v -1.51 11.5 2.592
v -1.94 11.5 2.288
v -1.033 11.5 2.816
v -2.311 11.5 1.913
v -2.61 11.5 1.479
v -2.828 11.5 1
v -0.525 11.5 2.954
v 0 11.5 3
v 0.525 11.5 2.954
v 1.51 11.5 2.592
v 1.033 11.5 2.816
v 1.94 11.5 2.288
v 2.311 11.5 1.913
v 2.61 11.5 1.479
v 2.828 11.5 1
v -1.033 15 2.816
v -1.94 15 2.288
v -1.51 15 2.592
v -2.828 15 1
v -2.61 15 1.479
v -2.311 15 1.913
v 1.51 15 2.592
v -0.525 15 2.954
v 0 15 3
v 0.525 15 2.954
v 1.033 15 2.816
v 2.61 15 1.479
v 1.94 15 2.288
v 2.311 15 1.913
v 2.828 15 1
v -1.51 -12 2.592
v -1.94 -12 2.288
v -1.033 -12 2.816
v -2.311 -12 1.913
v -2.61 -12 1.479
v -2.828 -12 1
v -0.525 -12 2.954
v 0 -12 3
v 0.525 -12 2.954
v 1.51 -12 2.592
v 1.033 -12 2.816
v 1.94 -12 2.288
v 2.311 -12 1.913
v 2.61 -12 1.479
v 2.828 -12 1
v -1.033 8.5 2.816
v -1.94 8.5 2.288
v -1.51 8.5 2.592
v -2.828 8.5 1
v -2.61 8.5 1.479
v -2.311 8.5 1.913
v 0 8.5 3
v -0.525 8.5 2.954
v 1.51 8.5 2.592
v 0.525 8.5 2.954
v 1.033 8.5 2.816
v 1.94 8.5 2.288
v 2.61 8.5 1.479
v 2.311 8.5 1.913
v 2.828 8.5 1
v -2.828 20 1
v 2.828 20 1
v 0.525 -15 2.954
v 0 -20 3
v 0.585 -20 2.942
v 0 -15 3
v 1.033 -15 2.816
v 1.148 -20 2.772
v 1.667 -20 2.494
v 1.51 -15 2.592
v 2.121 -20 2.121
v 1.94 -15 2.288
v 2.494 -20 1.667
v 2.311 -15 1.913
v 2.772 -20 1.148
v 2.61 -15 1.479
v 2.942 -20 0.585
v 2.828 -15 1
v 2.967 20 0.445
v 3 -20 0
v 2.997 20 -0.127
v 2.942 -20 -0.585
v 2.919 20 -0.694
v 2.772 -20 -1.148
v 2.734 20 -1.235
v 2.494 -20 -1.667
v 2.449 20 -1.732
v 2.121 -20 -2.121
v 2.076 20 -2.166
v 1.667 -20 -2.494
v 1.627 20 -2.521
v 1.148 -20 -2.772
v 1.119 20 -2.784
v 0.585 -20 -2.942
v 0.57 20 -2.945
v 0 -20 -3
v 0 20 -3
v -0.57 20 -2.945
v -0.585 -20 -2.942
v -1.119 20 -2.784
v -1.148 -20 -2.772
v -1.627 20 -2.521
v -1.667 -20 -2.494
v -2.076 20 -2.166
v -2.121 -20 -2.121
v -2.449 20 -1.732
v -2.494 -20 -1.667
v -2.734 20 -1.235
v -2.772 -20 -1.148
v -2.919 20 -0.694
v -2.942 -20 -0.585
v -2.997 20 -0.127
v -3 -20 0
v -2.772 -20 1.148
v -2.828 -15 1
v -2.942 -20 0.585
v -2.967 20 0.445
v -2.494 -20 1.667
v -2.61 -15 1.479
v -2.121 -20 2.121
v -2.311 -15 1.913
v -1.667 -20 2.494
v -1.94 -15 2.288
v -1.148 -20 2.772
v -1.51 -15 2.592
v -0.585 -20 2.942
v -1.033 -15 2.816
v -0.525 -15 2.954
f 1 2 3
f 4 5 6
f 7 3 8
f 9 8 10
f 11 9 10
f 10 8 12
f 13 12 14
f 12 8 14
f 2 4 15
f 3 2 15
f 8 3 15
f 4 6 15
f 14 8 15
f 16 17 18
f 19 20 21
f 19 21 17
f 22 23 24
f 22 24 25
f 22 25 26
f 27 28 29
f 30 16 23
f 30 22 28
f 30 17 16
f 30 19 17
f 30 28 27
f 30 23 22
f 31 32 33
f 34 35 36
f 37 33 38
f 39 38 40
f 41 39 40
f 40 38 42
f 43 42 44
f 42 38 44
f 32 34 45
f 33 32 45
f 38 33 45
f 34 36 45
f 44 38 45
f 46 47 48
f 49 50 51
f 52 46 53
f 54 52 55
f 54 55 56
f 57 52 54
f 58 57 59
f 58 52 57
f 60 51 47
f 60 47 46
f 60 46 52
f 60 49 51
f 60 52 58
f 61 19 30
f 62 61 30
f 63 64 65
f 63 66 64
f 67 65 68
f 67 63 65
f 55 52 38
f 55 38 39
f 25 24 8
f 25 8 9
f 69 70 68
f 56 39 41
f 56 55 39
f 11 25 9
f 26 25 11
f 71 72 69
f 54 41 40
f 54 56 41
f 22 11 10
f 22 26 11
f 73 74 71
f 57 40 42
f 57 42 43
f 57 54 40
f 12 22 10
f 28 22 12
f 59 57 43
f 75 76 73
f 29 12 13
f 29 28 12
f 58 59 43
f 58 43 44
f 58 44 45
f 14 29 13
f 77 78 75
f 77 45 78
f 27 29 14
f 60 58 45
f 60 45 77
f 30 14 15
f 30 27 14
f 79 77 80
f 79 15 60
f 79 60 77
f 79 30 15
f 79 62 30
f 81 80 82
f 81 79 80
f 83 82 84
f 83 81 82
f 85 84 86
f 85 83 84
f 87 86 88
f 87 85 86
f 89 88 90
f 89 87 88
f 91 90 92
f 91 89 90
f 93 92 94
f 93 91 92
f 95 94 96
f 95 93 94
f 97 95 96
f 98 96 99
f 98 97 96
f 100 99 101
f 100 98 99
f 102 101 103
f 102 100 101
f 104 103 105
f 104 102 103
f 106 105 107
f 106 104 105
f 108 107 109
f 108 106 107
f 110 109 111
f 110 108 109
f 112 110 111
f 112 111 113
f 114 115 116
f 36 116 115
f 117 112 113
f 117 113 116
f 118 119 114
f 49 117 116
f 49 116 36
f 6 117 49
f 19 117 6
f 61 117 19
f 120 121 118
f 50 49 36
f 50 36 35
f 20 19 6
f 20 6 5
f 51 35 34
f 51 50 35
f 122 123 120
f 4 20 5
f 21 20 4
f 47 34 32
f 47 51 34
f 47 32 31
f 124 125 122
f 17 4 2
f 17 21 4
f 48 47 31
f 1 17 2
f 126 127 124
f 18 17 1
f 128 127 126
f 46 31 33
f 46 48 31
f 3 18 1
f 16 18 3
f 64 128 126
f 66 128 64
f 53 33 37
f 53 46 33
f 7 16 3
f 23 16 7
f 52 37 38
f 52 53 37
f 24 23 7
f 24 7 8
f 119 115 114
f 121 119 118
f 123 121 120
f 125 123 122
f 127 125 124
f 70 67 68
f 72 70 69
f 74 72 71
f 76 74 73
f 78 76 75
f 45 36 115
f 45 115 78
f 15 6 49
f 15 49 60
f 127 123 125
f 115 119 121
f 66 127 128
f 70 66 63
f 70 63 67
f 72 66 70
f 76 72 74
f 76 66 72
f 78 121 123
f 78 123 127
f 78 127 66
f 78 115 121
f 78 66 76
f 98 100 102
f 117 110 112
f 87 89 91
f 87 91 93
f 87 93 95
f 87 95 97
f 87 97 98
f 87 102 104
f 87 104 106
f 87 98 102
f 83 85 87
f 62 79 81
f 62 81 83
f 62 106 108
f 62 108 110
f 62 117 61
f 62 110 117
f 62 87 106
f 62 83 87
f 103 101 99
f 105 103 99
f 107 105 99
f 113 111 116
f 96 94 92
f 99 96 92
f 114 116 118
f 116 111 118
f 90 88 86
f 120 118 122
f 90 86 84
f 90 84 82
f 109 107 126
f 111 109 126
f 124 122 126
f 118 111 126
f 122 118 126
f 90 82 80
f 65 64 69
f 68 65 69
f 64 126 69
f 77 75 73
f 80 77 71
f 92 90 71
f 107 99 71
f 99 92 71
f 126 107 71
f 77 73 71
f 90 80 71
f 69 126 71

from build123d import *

# Parameters (mm, degrees)
CROQUIS1_R                 = 3
SALIENTE_EXTRUIR1_DEPTH    = 20
CORTAR_EXTRUIR2_DEPTH      = 41.224370722
CORTAR_EXTRUIR2_DEPTH_BACK = 5
CROQUIS3_W                 = 8.224241852
CROQUIS3_H                 = 2
CROQUIS8_W                 = 6
CROQUIS8_H                 = 3
CORTAR_EXTRUIR4_DEPTH      = 10


with BuildPart() as part:
    # Croquis1 → Saliente-Extruir1 (new, symmetric)
    with BuildSketch(Plane(origin=(0, 0, 0), x_dir=(1, 0, 0), z_dir=(0, 1, 0))):
        Circle(CROQUIS1_R)
    extrude(amount=SALIENTE_EXTRUIR1_DEPTH, both=True)

    # Croquis3 → Cortar-Extruir2 (cut, two sides: drawn at the far end of the back side and taken through both)
    with BuildSketch(Plane(origin=(0, 20, 0), x_dir=(1, 0, 0), z_dir=(0, 1, 0)).offset(-CORTAR_EXTRUIR2_DEPTH_BACK)):
        with Locations((0.237694851, -2)):
            Rectangle(CROQUIS3_W, CROQUIS3_H)
    extrude(amount=CORTAR_EXTRUIR2_DEPTH + CORTAR_EXTRUIR2_DEPTH_BACK, mode=Mode.SUBTRACT)

    # Croquis8 → Cortar-Extruir4 (cut)
    with BuildSketch(Plane.XY.offset(1)):
        with Locations((0, 10)):
            Rectangle(CROQUIS8_W, CROQUIS8_H)
        with Locations((0, -13.5)):
            Rectangle(CROQUIS8_W, CROQUIS8_H)
    extrude(amount=CORTAR_EXTRUIR4_DEPTH, mode=Mode.SUBTRACT)


solid = part.part
